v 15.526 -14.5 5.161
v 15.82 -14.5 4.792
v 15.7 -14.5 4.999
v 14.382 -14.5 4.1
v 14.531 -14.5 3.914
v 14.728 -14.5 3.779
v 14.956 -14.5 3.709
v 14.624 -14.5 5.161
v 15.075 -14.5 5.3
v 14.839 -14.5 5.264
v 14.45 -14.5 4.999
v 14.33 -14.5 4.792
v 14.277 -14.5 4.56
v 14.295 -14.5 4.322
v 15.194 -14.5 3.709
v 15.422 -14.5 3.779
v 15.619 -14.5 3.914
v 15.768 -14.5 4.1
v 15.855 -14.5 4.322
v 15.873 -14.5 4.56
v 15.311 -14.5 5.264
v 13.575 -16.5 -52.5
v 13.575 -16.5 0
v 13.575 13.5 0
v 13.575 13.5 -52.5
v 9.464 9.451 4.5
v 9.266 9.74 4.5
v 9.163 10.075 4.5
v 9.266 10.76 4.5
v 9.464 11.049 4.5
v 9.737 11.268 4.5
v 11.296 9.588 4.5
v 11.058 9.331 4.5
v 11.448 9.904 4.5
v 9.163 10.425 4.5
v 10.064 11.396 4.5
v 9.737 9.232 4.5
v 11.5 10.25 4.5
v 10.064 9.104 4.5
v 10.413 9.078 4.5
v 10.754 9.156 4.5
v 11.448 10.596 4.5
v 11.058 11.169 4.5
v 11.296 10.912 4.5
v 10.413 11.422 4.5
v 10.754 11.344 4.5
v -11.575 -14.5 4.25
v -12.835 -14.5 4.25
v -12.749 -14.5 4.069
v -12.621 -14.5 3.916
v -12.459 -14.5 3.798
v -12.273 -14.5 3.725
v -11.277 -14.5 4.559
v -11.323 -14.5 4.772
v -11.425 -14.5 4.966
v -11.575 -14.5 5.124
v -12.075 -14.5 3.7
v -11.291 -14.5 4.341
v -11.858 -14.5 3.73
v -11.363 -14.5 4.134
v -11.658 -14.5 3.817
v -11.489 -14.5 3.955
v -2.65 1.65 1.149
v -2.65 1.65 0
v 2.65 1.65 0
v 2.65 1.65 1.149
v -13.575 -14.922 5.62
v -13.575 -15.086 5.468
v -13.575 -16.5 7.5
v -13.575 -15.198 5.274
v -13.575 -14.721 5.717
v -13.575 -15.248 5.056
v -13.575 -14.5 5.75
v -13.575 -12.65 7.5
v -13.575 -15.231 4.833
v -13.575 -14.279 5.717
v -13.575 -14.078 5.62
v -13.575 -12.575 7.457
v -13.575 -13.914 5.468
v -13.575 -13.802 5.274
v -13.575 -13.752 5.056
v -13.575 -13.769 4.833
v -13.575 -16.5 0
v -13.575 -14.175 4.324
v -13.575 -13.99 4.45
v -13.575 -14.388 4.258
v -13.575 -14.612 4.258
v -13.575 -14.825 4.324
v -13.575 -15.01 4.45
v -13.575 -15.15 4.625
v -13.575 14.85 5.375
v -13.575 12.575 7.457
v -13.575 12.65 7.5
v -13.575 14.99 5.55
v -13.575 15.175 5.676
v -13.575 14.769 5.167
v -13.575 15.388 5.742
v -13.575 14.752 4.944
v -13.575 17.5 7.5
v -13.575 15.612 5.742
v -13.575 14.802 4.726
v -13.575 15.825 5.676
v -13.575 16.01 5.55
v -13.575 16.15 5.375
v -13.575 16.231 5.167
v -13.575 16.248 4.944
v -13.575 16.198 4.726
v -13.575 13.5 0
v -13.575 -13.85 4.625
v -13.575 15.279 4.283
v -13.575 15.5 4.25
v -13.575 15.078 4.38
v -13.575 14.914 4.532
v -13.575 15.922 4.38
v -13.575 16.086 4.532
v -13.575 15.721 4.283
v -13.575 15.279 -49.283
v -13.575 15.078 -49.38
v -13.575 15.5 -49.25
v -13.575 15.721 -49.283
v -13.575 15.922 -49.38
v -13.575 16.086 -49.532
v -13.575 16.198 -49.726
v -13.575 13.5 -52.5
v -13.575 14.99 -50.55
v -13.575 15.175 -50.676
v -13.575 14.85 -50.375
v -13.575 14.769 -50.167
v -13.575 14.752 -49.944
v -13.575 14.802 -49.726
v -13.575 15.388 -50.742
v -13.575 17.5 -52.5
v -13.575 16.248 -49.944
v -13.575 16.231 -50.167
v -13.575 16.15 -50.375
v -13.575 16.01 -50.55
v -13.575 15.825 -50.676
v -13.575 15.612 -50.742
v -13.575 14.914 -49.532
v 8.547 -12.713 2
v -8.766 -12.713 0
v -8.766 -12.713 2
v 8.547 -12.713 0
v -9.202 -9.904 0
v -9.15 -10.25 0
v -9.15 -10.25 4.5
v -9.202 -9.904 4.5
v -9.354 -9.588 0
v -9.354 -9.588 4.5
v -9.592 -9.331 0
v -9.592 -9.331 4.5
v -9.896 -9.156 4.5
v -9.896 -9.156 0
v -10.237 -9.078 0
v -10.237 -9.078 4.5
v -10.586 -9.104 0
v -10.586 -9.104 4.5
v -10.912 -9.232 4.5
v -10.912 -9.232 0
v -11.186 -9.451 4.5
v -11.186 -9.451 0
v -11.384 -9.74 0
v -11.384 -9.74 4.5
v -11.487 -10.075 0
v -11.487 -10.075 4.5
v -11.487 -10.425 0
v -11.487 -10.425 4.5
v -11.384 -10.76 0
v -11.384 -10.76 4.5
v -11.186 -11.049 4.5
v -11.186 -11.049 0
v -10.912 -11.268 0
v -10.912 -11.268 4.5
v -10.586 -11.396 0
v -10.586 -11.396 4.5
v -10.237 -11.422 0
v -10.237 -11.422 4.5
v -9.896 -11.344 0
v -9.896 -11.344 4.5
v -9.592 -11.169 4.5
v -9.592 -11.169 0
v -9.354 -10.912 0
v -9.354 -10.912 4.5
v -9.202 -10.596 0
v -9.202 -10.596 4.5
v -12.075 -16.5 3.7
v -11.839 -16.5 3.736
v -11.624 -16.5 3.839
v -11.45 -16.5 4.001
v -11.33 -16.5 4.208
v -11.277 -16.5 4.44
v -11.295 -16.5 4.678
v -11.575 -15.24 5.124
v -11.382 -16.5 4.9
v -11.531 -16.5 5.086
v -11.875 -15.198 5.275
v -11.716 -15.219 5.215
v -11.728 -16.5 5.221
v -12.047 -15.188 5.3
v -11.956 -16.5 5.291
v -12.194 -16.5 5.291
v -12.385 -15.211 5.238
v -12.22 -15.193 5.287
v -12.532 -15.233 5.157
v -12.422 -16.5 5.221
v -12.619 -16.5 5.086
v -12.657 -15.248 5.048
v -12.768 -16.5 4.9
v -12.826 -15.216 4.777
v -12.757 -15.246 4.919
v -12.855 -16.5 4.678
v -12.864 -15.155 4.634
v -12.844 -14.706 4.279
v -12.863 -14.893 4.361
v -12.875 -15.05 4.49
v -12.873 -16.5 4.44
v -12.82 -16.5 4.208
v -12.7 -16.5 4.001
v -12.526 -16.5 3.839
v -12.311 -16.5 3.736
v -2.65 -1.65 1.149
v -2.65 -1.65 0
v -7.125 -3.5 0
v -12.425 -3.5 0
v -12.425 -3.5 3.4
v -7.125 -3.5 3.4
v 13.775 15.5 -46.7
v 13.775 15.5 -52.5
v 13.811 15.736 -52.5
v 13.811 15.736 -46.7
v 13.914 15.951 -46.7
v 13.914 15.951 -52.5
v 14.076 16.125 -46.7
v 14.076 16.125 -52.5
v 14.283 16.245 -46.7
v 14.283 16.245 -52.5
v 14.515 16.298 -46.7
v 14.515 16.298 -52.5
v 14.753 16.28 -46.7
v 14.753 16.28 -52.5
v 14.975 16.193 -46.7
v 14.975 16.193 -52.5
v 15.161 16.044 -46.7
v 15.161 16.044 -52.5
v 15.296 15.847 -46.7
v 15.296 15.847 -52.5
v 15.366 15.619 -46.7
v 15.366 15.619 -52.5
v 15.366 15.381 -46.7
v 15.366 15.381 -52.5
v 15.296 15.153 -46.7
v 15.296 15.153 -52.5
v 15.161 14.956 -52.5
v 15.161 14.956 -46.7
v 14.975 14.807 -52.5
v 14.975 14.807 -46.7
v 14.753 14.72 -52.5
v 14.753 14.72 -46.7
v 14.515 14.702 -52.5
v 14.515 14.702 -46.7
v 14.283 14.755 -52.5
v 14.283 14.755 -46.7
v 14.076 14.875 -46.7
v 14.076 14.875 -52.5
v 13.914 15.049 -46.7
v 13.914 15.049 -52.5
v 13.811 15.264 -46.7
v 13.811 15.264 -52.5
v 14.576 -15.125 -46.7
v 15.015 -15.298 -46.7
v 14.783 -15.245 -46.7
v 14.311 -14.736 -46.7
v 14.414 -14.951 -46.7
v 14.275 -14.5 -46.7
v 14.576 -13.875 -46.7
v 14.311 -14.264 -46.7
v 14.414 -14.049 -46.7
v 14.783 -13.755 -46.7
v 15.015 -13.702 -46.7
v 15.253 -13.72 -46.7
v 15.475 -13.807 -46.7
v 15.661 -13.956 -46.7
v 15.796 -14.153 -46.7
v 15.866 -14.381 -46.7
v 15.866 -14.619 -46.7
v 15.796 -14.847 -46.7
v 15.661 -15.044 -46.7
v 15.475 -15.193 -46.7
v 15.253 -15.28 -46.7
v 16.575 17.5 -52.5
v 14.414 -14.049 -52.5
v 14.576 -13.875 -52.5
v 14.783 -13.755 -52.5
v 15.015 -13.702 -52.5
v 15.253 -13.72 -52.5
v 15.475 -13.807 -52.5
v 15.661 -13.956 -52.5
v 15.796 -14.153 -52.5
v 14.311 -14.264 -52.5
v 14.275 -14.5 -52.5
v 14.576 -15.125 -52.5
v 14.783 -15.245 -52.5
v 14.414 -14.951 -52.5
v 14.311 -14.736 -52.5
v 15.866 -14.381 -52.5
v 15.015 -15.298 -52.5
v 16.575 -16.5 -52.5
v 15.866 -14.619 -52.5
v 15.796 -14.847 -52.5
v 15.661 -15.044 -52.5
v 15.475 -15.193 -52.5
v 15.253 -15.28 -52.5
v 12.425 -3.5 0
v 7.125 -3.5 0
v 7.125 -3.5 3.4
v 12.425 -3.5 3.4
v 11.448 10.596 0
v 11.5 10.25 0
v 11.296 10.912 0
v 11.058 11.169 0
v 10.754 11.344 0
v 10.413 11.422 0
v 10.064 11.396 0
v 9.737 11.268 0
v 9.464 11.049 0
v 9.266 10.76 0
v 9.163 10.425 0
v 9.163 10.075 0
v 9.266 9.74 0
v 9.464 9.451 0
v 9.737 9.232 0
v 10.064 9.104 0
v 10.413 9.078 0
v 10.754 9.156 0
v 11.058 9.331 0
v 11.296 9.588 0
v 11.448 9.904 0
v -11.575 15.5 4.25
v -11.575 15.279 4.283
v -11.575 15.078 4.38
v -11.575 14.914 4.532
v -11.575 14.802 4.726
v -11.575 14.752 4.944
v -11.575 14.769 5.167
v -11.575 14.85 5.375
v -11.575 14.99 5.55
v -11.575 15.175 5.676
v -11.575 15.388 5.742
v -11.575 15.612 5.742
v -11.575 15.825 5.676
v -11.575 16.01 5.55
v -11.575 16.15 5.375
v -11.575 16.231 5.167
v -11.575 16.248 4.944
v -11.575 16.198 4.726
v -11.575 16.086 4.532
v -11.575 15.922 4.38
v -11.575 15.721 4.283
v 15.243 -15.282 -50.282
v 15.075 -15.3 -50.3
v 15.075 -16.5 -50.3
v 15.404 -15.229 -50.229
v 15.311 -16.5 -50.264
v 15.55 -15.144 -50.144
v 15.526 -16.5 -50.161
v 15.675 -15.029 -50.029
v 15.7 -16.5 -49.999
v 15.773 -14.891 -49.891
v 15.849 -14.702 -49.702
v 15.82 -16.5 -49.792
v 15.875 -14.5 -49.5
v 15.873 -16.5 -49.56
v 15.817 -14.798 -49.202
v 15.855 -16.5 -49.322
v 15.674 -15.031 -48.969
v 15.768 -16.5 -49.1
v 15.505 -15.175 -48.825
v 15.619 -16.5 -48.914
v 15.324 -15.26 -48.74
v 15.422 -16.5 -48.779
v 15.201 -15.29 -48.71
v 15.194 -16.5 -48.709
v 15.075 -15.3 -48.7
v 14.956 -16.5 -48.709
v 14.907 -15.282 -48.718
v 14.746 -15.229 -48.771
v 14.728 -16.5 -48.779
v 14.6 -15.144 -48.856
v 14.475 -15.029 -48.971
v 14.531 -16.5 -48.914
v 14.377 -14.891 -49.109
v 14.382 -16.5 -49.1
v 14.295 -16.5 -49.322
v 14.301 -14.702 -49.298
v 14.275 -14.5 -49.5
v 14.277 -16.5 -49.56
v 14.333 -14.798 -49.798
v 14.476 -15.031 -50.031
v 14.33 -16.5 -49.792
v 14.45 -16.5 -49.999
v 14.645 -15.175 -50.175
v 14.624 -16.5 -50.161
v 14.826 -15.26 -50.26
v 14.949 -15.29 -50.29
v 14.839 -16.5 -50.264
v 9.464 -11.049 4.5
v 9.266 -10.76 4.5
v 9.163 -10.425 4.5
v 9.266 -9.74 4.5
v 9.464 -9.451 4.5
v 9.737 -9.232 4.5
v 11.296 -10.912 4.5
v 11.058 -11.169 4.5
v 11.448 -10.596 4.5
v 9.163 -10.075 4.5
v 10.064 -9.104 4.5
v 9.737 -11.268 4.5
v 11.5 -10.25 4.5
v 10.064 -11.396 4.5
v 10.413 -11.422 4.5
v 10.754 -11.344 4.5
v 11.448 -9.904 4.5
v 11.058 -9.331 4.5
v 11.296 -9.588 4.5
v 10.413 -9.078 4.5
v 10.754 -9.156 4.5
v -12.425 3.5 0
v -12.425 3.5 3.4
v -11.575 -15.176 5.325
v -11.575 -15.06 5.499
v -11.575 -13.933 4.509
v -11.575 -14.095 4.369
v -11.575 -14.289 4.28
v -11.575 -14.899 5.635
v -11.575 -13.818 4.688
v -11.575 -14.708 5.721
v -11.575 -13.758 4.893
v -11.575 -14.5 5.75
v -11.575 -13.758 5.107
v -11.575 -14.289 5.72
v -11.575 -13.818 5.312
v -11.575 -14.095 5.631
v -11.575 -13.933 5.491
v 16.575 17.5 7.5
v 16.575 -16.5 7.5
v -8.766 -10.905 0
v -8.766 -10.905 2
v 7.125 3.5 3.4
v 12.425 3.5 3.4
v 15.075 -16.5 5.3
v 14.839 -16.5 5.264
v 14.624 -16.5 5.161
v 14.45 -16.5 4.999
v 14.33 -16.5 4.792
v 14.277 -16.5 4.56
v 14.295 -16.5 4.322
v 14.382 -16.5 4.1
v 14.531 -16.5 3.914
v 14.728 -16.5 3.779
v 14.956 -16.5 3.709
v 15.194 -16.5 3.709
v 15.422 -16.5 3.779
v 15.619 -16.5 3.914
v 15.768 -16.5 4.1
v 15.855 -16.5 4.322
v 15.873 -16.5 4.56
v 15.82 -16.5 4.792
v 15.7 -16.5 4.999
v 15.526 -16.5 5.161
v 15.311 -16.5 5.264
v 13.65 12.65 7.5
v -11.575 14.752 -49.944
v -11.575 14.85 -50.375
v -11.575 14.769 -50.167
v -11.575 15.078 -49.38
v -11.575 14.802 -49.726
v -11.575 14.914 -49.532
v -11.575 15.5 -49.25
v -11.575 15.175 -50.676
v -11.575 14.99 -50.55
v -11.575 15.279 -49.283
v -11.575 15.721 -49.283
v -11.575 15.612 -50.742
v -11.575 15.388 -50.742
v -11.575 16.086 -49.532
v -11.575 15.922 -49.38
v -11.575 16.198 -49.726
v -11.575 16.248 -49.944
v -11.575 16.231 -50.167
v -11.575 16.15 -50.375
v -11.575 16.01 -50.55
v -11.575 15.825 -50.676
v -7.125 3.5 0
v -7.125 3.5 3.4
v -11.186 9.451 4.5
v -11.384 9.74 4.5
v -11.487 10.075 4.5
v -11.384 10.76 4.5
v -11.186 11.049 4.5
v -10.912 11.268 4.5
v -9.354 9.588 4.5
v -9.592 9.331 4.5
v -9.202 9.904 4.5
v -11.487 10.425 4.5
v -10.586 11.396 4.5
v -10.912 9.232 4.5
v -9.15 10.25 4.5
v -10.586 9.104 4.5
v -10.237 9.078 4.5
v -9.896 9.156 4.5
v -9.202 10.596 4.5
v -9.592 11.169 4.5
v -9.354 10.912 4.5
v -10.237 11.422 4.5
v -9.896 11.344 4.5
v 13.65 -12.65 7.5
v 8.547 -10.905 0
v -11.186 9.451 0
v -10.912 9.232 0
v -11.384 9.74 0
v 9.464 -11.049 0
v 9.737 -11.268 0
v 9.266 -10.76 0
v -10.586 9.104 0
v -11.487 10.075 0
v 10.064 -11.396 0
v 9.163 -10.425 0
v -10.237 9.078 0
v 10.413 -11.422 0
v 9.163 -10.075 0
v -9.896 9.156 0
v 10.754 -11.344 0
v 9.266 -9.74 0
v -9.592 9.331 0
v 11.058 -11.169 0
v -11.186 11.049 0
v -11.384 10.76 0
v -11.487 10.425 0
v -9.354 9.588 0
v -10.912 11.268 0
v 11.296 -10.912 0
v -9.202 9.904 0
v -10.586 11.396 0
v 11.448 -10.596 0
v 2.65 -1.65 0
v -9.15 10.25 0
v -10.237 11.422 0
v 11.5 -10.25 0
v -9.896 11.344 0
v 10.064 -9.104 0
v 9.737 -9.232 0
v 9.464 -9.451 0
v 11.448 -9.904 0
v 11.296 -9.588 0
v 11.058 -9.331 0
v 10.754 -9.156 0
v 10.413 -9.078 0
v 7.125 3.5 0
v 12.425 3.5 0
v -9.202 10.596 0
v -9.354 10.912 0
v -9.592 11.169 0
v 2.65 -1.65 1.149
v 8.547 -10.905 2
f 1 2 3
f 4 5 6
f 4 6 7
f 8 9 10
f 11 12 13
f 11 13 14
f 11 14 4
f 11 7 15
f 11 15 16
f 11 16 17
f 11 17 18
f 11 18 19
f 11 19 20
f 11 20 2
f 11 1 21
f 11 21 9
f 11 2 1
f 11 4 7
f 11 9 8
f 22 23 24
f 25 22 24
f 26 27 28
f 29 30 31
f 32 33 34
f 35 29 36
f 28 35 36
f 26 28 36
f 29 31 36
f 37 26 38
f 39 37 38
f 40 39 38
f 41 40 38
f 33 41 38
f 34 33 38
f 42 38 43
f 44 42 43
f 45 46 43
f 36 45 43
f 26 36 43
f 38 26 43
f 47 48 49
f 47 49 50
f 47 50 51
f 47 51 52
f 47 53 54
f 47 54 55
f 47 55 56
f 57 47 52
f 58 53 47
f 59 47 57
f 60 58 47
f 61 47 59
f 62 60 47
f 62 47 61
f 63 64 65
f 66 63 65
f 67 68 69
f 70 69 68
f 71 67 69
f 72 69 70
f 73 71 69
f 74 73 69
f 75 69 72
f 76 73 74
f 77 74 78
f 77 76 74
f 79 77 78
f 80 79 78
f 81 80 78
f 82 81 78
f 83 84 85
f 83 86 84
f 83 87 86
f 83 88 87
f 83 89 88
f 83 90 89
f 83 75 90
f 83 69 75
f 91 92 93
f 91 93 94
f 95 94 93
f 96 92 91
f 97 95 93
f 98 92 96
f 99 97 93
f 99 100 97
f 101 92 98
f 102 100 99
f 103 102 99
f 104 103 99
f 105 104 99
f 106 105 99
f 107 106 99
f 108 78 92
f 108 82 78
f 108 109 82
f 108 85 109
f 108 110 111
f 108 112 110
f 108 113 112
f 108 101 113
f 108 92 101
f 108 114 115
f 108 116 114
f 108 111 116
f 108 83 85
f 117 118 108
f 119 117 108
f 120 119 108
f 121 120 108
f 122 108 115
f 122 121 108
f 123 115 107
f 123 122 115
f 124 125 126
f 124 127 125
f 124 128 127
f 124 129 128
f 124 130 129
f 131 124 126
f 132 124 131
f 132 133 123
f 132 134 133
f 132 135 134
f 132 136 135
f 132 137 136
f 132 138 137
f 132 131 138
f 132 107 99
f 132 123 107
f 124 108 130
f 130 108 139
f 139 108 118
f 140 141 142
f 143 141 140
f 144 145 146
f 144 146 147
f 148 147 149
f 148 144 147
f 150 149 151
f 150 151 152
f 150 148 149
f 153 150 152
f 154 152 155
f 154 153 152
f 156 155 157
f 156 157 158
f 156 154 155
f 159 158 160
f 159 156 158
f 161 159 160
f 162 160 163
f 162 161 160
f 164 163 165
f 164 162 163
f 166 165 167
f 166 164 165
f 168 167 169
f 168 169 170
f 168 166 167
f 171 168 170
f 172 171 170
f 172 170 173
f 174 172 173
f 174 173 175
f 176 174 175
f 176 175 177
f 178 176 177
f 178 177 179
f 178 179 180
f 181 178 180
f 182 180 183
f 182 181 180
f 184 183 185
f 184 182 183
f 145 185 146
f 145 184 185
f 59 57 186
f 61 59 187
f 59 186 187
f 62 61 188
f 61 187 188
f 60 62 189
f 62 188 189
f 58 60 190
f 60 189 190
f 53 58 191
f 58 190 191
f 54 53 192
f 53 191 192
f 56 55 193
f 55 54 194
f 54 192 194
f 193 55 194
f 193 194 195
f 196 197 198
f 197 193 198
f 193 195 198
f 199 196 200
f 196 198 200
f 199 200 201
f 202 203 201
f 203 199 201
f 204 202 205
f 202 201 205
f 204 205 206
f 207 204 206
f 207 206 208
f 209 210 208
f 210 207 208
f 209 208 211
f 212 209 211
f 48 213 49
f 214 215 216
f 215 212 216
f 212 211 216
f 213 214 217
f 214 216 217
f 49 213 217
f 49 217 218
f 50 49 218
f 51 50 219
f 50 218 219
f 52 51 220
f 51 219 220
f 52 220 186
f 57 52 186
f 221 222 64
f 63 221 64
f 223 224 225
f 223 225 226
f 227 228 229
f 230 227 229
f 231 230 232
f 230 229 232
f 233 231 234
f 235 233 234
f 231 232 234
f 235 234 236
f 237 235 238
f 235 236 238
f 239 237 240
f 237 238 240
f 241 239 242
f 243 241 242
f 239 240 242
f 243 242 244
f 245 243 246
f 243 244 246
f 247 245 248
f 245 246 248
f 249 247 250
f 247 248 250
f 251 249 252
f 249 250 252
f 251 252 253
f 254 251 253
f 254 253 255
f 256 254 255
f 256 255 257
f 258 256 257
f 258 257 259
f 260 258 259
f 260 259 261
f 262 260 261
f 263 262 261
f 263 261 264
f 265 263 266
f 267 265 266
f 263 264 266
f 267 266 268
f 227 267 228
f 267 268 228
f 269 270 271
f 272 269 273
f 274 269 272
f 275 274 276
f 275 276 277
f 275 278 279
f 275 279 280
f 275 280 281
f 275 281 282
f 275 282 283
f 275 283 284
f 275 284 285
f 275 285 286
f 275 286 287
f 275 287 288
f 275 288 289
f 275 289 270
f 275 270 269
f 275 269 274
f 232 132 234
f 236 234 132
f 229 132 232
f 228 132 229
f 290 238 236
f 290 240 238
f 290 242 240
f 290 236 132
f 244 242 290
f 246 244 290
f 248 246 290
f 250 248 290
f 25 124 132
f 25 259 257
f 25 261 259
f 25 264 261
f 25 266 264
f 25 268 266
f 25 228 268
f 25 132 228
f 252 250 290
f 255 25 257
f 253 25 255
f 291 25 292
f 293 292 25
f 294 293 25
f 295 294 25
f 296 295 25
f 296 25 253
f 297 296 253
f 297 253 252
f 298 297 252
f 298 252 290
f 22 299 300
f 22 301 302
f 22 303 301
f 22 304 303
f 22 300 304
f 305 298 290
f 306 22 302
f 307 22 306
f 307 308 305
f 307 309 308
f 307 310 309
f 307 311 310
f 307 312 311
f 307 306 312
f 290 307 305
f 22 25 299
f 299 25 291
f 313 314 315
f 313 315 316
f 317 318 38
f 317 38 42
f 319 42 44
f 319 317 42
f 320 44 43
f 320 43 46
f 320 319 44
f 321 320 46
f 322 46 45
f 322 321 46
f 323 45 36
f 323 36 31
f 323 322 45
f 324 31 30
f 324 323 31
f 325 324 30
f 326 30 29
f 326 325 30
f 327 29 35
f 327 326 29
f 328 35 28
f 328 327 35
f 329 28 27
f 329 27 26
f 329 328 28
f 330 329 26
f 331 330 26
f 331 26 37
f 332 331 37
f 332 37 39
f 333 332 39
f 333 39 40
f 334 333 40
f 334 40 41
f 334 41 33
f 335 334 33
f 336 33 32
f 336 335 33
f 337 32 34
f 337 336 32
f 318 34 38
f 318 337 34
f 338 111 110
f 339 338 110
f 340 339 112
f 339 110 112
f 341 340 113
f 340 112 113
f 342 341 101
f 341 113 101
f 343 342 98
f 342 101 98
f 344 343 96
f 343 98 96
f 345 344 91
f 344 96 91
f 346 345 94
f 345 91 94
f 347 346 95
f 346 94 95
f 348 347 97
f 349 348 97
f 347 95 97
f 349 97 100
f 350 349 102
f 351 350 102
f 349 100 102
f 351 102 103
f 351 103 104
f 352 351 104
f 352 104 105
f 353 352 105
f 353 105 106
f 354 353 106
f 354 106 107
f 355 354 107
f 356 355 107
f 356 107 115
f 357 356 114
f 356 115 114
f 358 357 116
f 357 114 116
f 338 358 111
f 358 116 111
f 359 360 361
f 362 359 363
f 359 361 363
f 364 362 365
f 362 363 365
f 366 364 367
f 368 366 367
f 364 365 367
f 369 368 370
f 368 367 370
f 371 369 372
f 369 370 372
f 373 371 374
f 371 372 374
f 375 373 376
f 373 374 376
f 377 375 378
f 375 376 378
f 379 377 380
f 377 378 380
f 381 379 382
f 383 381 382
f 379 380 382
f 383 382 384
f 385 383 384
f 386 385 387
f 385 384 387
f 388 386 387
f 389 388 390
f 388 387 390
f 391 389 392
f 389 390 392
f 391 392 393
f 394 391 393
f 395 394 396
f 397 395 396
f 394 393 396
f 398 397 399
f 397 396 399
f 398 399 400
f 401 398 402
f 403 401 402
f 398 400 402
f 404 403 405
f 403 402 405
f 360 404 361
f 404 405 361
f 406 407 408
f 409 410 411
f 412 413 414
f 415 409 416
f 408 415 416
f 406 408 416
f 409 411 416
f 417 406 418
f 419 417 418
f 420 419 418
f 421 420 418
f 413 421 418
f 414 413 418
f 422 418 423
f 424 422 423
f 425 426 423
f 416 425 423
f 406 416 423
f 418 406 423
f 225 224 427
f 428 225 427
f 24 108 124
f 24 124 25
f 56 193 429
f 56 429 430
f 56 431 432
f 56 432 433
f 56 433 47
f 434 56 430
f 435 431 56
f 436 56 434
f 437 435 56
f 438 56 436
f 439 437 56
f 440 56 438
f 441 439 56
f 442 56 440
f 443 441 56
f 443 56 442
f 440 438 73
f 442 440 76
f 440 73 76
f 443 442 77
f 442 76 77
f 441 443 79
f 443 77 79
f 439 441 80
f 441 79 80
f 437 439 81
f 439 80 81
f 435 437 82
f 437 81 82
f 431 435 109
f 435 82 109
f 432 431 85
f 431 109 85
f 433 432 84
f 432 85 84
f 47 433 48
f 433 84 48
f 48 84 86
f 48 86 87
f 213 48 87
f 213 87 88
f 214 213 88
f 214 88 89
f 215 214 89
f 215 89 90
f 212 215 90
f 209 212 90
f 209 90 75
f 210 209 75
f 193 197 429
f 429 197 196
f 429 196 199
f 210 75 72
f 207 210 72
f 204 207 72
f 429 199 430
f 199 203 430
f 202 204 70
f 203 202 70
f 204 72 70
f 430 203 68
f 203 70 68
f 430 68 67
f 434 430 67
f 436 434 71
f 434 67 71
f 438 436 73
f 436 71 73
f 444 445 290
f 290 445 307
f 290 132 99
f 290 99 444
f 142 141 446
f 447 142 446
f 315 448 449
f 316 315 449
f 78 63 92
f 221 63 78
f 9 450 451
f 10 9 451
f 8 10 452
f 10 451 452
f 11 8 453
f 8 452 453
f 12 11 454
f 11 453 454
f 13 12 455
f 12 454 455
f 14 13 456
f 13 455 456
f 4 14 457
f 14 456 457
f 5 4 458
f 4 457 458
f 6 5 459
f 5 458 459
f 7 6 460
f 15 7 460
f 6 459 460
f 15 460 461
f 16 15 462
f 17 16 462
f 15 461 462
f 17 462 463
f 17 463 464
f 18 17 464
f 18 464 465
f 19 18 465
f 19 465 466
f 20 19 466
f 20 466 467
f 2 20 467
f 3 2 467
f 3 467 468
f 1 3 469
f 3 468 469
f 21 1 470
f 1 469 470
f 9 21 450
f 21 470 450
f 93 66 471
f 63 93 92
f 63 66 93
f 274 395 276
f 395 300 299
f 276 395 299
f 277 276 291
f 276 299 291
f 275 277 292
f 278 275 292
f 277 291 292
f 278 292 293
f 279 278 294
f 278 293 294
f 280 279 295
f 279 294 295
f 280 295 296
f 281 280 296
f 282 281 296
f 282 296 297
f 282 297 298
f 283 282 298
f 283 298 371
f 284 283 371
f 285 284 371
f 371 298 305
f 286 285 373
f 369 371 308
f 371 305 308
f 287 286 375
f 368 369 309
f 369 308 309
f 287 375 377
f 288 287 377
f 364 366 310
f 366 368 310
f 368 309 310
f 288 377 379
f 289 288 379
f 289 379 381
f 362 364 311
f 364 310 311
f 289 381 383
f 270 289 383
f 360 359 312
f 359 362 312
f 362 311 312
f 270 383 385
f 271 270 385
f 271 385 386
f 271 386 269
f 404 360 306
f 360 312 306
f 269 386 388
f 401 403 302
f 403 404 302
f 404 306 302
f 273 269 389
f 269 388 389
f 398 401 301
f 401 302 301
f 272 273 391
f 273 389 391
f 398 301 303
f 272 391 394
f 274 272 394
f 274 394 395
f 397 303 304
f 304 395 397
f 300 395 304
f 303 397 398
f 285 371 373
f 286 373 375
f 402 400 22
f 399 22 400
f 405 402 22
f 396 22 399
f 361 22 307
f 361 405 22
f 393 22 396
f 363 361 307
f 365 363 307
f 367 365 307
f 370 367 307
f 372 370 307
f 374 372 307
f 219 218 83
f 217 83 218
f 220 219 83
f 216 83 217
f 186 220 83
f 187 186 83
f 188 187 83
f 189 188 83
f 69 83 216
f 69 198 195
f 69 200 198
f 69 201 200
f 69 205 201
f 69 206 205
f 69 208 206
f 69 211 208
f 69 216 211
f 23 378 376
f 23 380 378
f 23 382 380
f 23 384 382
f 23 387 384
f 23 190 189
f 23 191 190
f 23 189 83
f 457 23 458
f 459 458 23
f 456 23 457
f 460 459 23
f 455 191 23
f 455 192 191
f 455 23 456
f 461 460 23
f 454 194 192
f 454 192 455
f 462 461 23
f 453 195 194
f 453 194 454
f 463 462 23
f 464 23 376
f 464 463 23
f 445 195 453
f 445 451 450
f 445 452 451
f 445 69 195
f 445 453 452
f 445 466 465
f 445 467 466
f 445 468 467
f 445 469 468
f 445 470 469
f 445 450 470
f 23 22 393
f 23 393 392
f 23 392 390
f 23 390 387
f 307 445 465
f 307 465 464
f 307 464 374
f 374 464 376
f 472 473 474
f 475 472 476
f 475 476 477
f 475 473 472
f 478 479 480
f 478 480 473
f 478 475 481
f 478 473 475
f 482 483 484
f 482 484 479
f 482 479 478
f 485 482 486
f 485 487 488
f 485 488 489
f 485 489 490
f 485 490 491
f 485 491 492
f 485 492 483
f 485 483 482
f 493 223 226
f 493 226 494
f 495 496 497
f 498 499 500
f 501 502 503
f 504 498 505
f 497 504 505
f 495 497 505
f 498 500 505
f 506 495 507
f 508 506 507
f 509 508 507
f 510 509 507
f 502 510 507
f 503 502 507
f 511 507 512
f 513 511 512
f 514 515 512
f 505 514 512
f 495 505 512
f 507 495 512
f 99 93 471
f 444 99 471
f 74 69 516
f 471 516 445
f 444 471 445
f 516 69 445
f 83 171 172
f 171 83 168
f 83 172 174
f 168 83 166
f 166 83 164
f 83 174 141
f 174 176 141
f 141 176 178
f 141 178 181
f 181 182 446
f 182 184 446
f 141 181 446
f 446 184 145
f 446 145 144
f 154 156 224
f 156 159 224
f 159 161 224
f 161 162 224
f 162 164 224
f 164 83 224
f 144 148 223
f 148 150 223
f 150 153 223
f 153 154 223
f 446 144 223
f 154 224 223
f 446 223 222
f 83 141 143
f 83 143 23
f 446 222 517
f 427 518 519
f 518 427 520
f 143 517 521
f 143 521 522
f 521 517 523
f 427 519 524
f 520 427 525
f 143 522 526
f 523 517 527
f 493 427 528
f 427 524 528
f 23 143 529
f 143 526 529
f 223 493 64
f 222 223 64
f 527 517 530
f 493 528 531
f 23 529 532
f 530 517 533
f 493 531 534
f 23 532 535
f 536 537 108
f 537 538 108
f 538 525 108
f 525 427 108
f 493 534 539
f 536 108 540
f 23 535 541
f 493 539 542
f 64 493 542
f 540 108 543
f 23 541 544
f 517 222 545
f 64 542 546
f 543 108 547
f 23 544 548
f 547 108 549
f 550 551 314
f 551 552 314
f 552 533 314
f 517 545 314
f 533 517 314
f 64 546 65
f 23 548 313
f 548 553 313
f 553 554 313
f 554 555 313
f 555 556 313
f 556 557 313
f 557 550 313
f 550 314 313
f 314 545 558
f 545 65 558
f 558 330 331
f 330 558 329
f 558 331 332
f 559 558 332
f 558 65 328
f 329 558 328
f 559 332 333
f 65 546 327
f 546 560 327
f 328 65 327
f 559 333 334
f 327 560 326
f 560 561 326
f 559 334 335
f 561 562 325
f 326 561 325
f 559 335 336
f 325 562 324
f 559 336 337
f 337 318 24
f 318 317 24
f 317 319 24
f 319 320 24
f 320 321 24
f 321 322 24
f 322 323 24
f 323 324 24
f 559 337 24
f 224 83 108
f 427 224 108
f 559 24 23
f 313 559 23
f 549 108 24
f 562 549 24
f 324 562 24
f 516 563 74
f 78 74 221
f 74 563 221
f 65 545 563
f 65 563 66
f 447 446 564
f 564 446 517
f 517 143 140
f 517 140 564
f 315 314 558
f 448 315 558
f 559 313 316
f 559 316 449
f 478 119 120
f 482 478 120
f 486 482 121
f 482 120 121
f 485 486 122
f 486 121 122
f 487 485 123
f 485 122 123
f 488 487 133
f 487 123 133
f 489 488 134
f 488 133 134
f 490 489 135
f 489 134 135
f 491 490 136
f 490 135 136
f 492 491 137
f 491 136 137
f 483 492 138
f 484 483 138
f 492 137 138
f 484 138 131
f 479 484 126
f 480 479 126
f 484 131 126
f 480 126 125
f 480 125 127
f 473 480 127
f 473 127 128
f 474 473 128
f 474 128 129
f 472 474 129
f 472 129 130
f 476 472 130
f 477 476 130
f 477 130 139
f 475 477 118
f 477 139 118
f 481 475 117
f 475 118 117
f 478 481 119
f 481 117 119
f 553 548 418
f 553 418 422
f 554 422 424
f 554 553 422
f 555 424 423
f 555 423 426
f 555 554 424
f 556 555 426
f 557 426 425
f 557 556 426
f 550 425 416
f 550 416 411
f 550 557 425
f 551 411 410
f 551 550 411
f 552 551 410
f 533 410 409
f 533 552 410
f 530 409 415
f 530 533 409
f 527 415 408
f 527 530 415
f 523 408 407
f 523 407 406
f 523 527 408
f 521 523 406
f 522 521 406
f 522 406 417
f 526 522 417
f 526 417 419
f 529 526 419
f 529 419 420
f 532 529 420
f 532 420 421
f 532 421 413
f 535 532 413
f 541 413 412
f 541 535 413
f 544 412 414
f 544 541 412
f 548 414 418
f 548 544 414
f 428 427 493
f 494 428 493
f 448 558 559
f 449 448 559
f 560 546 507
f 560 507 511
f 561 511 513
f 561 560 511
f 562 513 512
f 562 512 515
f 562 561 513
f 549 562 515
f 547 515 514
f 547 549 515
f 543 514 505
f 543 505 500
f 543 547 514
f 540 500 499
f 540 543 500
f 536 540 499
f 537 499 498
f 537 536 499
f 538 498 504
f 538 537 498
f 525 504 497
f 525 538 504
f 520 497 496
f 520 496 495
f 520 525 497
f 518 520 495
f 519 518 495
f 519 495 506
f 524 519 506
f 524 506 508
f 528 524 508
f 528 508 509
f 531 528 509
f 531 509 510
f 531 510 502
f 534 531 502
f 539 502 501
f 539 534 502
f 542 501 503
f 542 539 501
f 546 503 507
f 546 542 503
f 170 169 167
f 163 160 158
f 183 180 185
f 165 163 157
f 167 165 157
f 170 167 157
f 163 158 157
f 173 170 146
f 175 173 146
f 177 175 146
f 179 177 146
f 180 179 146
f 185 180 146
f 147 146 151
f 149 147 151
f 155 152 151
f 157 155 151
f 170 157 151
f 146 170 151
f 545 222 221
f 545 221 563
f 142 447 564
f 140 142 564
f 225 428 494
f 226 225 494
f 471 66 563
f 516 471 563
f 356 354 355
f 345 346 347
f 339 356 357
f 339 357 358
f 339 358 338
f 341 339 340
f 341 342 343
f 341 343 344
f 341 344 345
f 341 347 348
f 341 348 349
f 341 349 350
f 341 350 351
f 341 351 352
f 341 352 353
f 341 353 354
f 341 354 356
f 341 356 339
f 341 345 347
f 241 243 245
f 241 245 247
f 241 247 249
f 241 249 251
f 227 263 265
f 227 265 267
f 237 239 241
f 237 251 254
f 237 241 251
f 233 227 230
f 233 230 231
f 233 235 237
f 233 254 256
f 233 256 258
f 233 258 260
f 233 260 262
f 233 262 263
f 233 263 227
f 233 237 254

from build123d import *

# Parameters (mm, degrees)
SKETCH2_W           = 33.15
SKETCH2_H           = 33
BOSS_EXTRUDE1_DEPTH = 7.5
SKETCH3_R           = 1.175
CUT_EXTRUDE1_DEPTH  = 4.5
SKETCH4_W           = 5.3
SKETCH4_H           = 7
CUT_EXTRUDE2_DEPTH  = 3.4
SKETCH5_W           = 17.312690108
SKETCH5_H           = 1.808425299
CUT_EXTRUDE3_DEPTH  = 2
SKETCH6_W           = 5.3
SKETCH6_H           = 3.3
CUT_EXTRUDE4_DEPTH  = 25.560753755
CHAMFER3_SIZE       = 11
CHAMFER3_SIZE2      = 6.350852961
SKETCH7_W           = 3
SKETCH7_H           = 33
SKETCH7_H_2         = 30
BOSS_EXTRUDE2_DEPTH = 52.5
SKETCH8_W           = 33.15
SKETCH8_H           = 60
BOSS_EXTRUDE3_DEPTH = 1
SKETCH9_W           = 3
SKETCH9_H           = 34
CUT_EXTRUDE5_DEPTH  = 60
SKETCH10_R          = 0.75
CUT_EXTRUDE6_DEPTH  = 2
SKETCH11_R          = 0.8
CUT_EXTRUDE7_DEPTH  = 2
SKETCH12_R          = 0.8
CUT_EXTRUDE9_DEPTH  = 5.8


with BuildPart() as part:
    # Sketch2 → Boss-Extrude1 (new body)
    with BuildSketch(Plane.XY):
        Rectangle(SKETCH2_W, SKETCH2_H)
    extrude(amount=BOSS_EXTRUDE1_DEPTH)

    # Sketch3 → Cut-Extrude1 (cut)
    with BuildSketch(Plane.XY):
        with Locations((10.325, 10.25)):
            Circle(SKETCH3_R)
        with Locations((-10.325, 10.25)):
            Circle(SKETCH3_R)
        with Locations((10.325, -10.25)):
            Circle(SKETCH3_R)
        with Locations((-10.325, -10.25)):
            Circle(SKETCH3_R)
    extrude(amount=CUT_EXTRUDE1_DEPTH, mode=Mode.SUBTRACT)

    # Sketch4 → Cut-Extrude2 (cut)
    with BuildSketch(Plane.XY):
        with Locations((9.775, 0)):
            Rectangle(SKETCH4_W, SKETCH4_H)
        with Locations((-9.775, 0)):
            Rectangle(SKETCH4_W, SKETCH4_H)
    extrude(amount=CUT_EXTRUDE2_DEPTH, mode=Mode.SUBTRACT)

    # Sketch5 → Cut-Extrude3 (cut)
    with BuildSketch(Plane.XY):
        with Locations((-0.109621432, -11.80915301)):
            Rectangle(SKETCH5_W, SKETCH5_H)
    extrude(amount=CUT_EXTRUDE3_DEPTH, mode=Mode.SUBTRACT)

    # Sketch6 → Cut-Extrude4 (cut, through all)
    with BuildSketch(Plane.XY):
        Rectangle(SKETCH6_W, SKETCH6_H)
    extrude(amount=CUT_EXTRUDE4_DEPTH, mode=Mode.SUBTRACT)

    # Chamfer3
    chamfer3_edges = [part.edges().sort_by_distance(p)[0] for p in [
        (2.65, 0, 7.5),
        (0, 1.65, 7.5),
        (-2.65, 0, 7.5),
        (0, -1.65, 7.5),
    ]]
    chamfer3_side = [part.faces().sort_by_distance(p)[0] for p in [
        (-16.107247662, 0, 7.5),
    ]]
    chamfer(chamfer3_edges, length=CHAMFER3_SIZE, length2=CHAMFER3_SIZE2, reference=chamfer3_side[0])

    # Sketch7 → Boss-Extrude2 (add)
    with BuildSketch(Plane.XY):
        with Locations((15.075, 0)):
            Rectangle(SKETCH7_W, SKETCH7_H)
        Polygon((-13.575, 13.5), (13.575, 13.5), (13.575, 16.5), (-16.575, 16.5), (-16.575, 13.5), align=None)
        with Locations((-15.075, -1.5)):
            Rectangle(SKETCH7_W, SKETCH7_H_2)
    extrude(amount=-BOSS_EXTRUDE2_DEPTH)

    # Sketch8 → Boss-Extrude3 (add)
    with BuildSketch(Plane(origin=(0, 16.5, 0), x_dir=(1, 0, 0), z_dir=(0, 1, 0))):
        with Locations((0, 22.5)):
            Rectangle(SKETCH8_W, SKETCH8_H)
    extrude(amount=BOSS_EXTRUDE3_DEPTH)

    # Sketch9 → Cut-Extrude5 (cut)
    with BuildSketch(Plane(origin=(0, 0, -52.5), x_dir=(-1, 0, 0), z_dir=(0, 0, -1))):
        with Locations((15.075, 0.5)):
            Rectangle(SKETCH9_W, SKETCH9_H)
    extrude(amount=-CUT_EXTRUDE5_DEPTH, mode=Mode.SUBTRACT)

    # Sketch10 → Cut-Extrude6 (cut)
    with BuildSketch(Plane.ZY.offset(13.575)):
        with Locations((-50, 15.5)):
            Circle(SKETCH10_R)
        with Locations(Location((5, 15.5, 0), (0, 0, 180))):
            Circle(SKETCH10_R)
        with Locations((5, -14.5)):
            Circle(SKETCH10_R)
    extrude(amount=-CUT_EXTRUDE6_DEPTH, mode=Mode.SUBTRACT)

    # Sketch11 → Cut-Extrude7 (cut)
    with BuildSketch(Plane(origin=(0, -16.5, 0), x_dir=(-1, 0, 0), z_dir=(0, -1, 0))):
        with Locations(Location((-15.075, 49.5, 0), (0, 0, 90))):
            Circle(SKETCH11_R)
        with Locations(Location((-15.075, -4.5, 0), (0, 0, 270))):
            Circle(SKETCH11_R)
        with Locations(Location((12.075, -4.5, 0), (0, 0, 90))):
            Circle(SKETCH11_R)
    extrude(amount=-CUT_EXTRUDE7_DEPTH, mode=Mode.SUBTRACT)

    # Sketch12 → Cut-Extrude9 (cut)
    with BuildSketch(Plane(origin=(0, 0, -52.5), x_dir=(-1, 0, 0), z_dir=(0, 0, -1))):
        with Locations((-14.575, 15.5)):
            Circle(SKETCH12_R)
        with Locations((-15.075, -14.5)):
            Circle(SKETCH12_R)
    extrude(amount=-CUT_EXTRUDE9_DEPTH, mode=Mode.SUBTRACT)


solid = part.part
